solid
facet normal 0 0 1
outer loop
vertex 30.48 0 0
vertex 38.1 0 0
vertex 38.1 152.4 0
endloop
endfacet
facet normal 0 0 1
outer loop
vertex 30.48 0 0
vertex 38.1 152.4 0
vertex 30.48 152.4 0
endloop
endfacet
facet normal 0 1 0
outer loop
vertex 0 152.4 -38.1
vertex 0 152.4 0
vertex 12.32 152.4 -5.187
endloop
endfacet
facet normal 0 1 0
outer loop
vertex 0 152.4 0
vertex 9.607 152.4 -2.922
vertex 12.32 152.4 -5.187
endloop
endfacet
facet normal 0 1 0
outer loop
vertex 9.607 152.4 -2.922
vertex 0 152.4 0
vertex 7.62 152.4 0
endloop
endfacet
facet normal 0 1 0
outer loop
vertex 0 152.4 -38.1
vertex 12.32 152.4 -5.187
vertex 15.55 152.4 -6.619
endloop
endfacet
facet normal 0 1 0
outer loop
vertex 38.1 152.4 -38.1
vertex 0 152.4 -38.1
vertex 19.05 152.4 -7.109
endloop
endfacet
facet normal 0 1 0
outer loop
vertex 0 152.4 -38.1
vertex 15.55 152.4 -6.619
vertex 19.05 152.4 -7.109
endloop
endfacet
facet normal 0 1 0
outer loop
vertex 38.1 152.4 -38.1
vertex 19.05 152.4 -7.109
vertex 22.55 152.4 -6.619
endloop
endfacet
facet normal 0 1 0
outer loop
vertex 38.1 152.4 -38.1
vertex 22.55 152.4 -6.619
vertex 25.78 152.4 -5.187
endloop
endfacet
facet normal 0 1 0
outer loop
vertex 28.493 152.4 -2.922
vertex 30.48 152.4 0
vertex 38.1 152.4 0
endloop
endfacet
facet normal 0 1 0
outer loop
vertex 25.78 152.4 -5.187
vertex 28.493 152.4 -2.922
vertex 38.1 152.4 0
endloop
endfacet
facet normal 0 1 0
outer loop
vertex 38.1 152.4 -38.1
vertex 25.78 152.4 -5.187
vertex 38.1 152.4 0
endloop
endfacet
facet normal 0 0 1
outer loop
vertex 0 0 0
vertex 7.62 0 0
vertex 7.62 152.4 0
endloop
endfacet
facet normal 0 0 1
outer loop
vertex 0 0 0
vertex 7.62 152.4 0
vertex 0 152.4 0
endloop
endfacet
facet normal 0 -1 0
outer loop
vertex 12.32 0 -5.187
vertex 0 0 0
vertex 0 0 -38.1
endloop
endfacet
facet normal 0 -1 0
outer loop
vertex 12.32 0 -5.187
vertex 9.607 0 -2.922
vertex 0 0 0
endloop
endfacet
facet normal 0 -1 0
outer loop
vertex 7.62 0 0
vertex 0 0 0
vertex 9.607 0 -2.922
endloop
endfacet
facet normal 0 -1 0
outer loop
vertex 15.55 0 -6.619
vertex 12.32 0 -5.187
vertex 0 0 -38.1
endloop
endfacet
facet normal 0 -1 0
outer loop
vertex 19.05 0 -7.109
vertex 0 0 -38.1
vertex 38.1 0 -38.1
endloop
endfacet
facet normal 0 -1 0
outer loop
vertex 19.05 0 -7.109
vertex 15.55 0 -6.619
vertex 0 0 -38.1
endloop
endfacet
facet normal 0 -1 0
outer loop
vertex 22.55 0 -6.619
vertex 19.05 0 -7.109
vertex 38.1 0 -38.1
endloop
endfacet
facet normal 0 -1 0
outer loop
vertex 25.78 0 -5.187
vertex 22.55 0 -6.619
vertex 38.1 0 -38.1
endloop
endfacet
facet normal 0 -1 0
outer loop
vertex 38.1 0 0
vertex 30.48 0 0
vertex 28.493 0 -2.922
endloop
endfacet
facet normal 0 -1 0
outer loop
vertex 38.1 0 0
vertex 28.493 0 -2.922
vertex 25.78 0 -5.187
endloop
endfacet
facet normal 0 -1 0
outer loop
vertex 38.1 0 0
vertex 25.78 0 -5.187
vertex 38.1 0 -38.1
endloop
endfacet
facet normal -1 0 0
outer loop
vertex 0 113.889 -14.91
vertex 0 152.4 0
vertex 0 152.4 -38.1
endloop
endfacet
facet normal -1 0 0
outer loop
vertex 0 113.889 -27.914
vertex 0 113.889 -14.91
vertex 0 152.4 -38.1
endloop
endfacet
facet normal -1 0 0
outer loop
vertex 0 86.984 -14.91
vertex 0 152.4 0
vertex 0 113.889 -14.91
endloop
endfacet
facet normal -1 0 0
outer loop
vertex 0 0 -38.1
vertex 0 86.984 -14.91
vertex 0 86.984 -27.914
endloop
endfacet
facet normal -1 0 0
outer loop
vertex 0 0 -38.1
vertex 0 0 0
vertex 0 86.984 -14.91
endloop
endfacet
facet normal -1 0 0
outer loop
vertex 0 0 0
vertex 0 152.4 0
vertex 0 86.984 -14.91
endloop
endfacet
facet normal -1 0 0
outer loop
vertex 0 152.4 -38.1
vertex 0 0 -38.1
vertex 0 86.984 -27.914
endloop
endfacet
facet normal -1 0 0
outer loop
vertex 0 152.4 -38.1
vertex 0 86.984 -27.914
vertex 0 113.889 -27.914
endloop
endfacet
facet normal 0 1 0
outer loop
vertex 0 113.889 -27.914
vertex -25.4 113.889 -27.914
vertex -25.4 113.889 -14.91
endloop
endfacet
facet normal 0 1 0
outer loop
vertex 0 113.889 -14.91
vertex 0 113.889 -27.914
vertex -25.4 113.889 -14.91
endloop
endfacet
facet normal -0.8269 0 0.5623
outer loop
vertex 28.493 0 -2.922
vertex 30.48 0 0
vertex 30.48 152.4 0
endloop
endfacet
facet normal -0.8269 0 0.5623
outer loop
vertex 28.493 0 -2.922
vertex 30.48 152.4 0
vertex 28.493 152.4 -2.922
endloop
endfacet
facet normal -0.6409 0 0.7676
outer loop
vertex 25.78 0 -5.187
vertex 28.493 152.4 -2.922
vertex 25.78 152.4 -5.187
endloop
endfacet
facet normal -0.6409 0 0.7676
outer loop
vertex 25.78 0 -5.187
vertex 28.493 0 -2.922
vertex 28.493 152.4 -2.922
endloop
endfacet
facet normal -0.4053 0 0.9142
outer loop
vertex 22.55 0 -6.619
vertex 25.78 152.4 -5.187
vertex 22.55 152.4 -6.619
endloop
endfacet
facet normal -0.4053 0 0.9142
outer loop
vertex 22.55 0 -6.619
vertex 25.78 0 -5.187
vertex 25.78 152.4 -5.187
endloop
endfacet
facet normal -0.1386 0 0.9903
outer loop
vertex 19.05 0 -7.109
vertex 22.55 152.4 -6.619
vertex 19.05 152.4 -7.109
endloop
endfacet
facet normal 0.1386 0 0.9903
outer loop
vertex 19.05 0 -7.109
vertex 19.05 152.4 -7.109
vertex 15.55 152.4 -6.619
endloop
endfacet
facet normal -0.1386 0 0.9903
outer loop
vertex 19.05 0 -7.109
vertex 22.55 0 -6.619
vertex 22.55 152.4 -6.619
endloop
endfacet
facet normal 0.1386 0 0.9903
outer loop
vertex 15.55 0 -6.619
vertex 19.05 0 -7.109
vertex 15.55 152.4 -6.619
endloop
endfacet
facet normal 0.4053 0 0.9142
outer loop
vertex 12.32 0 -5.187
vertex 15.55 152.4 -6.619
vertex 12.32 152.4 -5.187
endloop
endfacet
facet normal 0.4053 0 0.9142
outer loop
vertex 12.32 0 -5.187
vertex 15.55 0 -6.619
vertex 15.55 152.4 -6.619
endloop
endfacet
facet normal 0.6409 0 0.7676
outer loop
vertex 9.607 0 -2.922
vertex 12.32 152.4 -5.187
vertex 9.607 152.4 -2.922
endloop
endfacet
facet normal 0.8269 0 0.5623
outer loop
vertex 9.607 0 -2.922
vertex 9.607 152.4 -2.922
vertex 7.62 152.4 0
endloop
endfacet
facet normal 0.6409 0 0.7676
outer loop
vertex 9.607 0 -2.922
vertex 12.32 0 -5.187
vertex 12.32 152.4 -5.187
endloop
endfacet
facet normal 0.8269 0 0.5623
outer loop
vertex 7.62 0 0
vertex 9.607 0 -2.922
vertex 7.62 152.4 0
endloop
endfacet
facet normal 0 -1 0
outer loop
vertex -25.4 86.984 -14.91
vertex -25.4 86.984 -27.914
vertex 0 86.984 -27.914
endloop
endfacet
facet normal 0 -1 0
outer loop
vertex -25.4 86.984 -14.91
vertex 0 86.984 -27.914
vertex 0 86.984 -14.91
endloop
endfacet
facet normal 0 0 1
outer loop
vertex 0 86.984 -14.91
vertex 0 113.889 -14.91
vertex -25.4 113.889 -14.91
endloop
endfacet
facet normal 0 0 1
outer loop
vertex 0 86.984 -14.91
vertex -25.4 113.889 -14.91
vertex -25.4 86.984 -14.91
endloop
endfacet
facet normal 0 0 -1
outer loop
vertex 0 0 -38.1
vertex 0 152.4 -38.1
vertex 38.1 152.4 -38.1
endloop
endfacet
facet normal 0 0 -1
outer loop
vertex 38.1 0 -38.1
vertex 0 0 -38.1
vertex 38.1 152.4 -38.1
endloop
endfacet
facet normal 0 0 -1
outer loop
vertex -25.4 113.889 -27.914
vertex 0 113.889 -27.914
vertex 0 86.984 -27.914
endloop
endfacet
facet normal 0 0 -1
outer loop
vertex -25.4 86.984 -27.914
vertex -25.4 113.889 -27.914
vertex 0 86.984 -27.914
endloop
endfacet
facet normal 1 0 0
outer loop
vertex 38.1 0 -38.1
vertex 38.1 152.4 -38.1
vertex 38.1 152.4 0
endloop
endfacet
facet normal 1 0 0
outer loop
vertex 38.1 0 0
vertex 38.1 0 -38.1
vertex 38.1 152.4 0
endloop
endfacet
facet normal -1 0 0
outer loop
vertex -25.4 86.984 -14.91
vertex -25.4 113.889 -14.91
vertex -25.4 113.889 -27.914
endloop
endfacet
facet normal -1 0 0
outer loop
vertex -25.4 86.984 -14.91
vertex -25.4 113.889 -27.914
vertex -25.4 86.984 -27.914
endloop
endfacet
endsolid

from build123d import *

# Parameters (mm, degrees)
F1_DEPTH = 152.4
F2_W     = 26.905142
F2_H     = 13.003318
F3_DEPTH = 25.4


with BuildPart() as f1:
    # F0 (on Front) → F1 (new body)
    with BuildSketch(Plane.XZ):
        with BuildLine():
            Line((7.62, 0), (0, 0))
            Line((0, 0), (0, -38.1))
            Line((0, -38.1), (38.1, -38.1))
            Line((38.1, -38.1), (38.1, 0))
            Line((38.1, 0), (30.48, 0))
            ThreePointArc((30.48, 0), (19.05, -7.108659), (7.62, 0))
        make_face()
    extrude(amount=-F1_DEPTH)

    # F2 (on face) → F3 (join)
    with BuildSketch(Plane(origin=(0, 0, 0), x_dir=(0, -1, 0), z_dir=(-1, 0, 0))):
        with Locations((-100.436237, -21.411889)):
            Rectangle(F2_W, F2_H)
    extrude(amount=F3_DEPTH)


solid = f1.part
